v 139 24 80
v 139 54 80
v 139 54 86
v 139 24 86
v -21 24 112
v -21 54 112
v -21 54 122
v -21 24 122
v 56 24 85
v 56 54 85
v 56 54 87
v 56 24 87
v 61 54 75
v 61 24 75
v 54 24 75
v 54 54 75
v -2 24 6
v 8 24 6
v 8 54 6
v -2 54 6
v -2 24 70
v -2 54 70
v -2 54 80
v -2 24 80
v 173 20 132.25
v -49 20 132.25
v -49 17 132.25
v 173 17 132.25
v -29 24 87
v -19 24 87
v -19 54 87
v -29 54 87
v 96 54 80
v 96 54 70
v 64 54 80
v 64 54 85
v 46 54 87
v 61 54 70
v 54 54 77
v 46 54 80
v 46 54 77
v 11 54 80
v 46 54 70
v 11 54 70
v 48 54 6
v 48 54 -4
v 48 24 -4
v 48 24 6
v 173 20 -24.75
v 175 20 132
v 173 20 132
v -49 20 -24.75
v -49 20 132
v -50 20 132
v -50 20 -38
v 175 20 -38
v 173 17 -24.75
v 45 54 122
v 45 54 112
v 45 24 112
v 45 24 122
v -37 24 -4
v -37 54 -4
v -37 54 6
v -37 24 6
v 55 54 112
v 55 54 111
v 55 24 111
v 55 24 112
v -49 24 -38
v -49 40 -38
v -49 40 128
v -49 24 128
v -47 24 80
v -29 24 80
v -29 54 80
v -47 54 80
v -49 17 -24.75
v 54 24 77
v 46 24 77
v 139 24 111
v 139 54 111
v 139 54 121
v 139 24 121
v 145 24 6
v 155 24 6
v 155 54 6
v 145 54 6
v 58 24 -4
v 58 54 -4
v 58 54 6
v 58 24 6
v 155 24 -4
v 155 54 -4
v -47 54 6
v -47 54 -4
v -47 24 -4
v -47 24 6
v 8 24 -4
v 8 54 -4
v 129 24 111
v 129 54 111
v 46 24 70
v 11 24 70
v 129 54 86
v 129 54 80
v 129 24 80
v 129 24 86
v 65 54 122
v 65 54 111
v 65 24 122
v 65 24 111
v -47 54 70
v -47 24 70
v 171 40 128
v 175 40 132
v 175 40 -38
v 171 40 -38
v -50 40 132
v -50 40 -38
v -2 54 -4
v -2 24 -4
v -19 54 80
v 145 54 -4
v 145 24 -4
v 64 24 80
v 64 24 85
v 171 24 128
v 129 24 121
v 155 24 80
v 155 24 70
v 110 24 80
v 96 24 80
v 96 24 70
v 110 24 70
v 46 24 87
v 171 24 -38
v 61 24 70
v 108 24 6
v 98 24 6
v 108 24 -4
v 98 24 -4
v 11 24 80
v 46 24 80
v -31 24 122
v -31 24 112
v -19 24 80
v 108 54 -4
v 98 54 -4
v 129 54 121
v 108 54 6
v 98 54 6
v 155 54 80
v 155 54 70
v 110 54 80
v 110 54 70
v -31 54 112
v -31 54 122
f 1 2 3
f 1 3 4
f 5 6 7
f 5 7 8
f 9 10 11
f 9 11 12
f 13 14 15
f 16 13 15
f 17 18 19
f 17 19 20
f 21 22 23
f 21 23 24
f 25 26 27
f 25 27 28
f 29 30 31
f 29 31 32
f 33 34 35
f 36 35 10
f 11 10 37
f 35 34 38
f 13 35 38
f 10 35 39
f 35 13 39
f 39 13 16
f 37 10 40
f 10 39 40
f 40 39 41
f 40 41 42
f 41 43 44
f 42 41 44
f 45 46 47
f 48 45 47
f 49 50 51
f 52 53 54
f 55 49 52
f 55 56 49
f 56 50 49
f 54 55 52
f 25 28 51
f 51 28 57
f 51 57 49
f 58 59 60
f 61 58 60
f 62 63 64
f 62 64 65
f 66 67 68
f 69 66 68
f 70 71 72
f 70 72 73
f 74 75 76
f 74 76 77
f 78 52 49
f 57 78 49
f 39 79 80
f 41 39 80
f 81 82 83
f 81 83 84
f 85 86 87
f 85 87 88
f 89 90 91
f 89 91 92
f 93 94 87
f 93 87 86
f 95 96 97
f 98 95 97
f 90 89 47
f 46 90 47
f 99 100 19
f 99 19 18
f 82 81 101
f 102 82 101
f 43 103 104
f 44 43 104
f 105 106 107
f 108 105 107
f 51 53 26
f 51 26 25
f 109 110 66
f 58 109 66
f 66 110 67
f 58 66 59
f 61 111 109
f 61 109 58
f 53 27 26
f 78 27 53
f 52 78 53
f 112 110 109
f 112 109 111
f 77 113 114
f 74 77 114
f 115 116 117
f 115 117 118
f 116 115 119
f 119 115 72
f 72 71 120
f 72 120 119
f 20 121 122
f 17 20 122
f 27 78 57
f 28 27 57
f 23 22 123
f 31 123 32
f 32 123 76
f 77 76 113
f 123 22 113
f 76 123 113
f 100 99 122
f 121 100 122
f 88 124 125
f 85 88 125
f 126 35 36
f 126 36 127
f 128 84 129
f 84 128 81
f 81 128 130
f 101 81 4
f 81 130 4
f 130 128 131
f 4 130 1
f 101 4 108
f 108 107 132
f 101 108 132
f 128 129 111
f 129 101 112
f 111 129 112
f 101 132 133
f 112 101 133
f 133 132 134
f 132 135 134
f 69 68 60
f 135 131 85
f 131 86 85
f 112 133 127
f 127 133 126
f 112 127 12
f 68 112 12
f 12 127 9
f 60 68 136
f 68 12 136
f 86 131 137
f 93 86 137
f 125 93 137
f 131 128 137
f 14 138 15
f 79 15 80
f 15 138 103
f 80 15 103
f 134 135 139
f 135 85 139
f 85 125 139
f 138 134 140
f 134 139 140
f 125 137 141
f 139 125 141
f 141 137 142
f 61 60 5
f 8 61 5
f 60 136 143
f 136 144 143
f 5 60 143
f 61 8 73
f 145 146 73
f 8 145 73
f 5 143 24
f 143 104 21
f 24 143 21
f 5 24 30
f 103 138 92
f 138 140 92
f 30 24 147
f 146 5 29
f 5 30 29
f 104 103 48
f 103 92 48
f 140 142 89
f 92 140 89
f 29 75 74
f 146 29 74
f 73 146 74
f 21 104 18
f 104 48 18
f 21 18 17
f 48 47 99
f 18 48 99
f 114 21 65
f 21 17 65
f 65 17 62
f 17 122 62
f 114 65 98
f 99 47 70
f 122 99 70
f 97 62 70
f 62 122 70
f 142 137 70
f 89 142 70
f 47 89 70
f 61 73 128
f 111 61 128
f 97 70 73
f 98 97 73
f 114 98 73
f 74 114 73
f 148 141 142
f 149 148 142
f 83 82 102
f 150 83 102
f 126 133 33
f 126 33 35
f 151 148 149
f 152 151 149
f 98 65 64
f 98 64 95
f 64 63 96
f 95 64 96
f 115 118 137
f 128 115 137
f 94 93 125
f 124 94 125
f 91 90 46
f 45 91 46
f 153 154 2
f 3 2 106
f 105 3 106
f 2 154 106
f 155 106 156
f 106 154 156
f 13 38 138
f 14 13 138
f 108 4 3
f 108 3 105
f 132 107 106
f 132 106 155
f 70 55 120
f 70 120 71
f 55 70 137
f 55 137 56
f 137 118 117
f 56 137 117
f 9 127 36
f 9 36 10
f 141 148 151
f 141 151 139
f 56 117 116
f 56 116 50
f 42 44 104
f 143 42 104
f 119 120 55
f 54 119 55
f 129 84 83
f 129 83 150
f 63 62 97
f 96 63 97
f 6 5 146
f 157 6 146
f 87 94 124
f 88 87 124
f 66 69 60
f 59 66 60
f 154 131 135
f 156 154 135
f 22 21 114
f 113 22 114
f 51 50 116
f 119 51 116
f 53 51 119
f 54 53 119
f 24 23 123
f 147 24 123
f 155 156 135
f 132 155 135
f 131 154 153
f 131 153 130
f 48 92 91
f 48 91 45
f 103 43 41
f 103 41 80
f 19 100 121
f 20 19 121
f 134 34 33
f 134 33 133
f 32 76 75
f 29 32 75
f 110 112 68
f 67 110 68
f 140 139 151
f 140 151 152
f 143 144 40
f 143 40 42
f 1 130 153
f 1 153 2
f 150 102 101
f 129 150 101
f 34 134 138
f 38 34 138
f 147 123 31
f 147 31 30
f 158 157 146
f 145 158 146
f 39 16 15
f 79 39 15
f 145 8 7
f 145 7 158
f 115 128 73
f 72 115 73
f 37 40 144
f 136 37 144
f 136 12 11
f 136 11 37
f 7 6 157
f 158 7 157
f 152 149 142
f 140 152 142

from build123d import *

# Parameters (mm, degrees)
BOX039_W                  = 222
BOX039_H                  = 3
BOX039_DEPTH              = 157
BOX081_W                  = 300
BOX081_H                  = 50
BOX081_DEPTH              = 200
BOX114_W                  = 1
BOX114_H                  = 20
BOX114_DEPTH              = 275
BOX115_W                  = 4
BOX115_H                  = 20
BOX115_DEPTH              = 275
BOX116_W                  = 225
BOX116_H                  = 20
BOX116_DEPTH              = 4
BOX117_W                  = 225
BOX117_H                  = 20
BOX117_DEPTH              = 1
BOX103_W                  = 35
BOX103_H                  = 30
BOX103_DEPTH              = 10
BOX104_W                  = 10
BOX104_H                  = 30
BOX104_DEPTH              = 10
BOX105_W                  = 10
BOX105_H                  = 30
BOX105_DEPTH              = 10
BOX106_W                  = 10
BOX106_H                  = 28.9
BOX106_DEPTH              = 10
BOX091_W                  = 10
BOX091_H                  = 28.9
BOX091_DEPTH              = 10
BOX092_W                  = 10
BOX092_H                  = 28.9
BOX092_DEPTH              = 10
BOX094_W                  = 12
BOX094_H                  = 30
BOX094_DEPTH              = 10
BOX093_W                  = 10
BOX093_H                  = 28.9
BOX093_DEPTH              = 10
BOX095_W                  = 45
BOX095_H                  = 30
BOX095_DEPTH              = 10
BOX097_W                  = 45
BOX097_H                  = 30
BOX097_DEPTH              = 10
BOX096_W                  = 35
BOX096_H                  = 30
BOX096_DEPTH              = 10
BOX098_W                  = 35
BOX098_H                  = 30
BOX098_DEPTH              = 10
BOX099_W                  = 45
BOX099_H                  = 30
BOX099_DEPTH              = 10
BOX100_W                  = 35
BOX100_H                  = 30
BOX100_DEPTH              = 10
BOX101_W                  = 45
BOX101_H                  = 30
BOX101_DEPTH              = 10
BOX082_W                  = 10
BOX082_H                  = 30
BOX082_DEPTH              = 10
BOX102_W                  = 10
BOX102_H                  = 30
BOX102_DEPTH              = 10
BOX083_W                  = 18
BOX083_H                  = 30
BOX083_DEPTH              = 10
BOX084_W                  = 10
BOX084_H                  = 30
BOX084_DEPTH              = 10
BOX085_W                  = 10
BOX085_H                  = 30
BOX085_DEPTH              = 10
BOX086_W                  = 10
BOX086_H                  = 30
BOX086_DEPTH              = 10
BOX087_W                  = 10
BOX087_H                  = 30
BOX087_DEPTH              = 10
BOX113_W                  = 10
BOX113_H                  = 30
BOX113_DEPTH              = 10
BOX112_W                  = 10
BOX112_H                  = 30
BOX112_DEPTH              = 10
BOX111_W                  = 10
BOX111_H                  = 30
BOX111_DEPTH              = 10
BOX109_W                  = 10
BOX109_H                  = 30
BOX109_DEPTH              = 10
BOX108_W                  = 10
BOX108_H                  = 30
BOX108_DEPTH              = 10
BOX088_W                  = 10
BOX088_H                  = 30
BOX088_DEPTH              = 11
BOX089_W                  = 10
BOX089_H                  = 30
BOX089_DEPTH              = 10
BOX090_W                  = 10
BOX090_H                  = 30
BOX090_DEPTH              = 10
BOX110_W                  = 10
BOX110_H                  = 30
BOX110_DEPTH              = 10
BOX107_W                  = 220
BOX107_H                  = 4
BOX107_DEPTH              = 275
FUSION013_PLACEMENT_ANGLE = 180
BOX150_W                  = 1
BOX150_H                  = 20
BOX150_DEPTH              = 275
BOX151_W                  = 4
BOX151_H                  = 20
BOX151_DEPTH              = 275
BOX152_W                  = 225
BOX152_H                  = 20
BOX152_DEPTH              = 4
BOX153_W                  = 225
BOX153_H                  = 20
BOX153_DEPTH              = 1
BOX119_W                  = 35
BOX119_H                  = 30
BOX119_DEPTH              = 10
BOX120_W                  = 10
BOX120_H                  = 30
BOX120_DEPTH              = 10
BOX121_W                  = 10
BOX121_H                  = 30
BOX121_DEPTH              = 10
BOX122_W                  = 10
BOX122_H                  = 28.9
BOX122_DEPTH              = 10
BOX123_W                  = 10
BOX123_H                  = 28.9
BOX123_DEPTH              = 10
BOX124_W                  = 10
BOX124_H                  = 28.9
BOX124_DEPTH              = 10
BOX126_W                  = 12
BOX126_H                  = 30
BOX126_DEPTH              = 10
BOX125_W                  = 10
BOX125_H                  = 28.9
BOX125_DEPTH              = 10
BOX127_W                  = 45
BOX127_H                  = 30
BOX127_DEPTH              = 10
BOX129_W                  = 45
BOX129_H                  = 30
BOX129_DEPTH              = 10
BOX128_W                  = 35
BOX128_H                  = 30
BOX128_DEPTH              = 10
BOX130_W                  = 35
BOX130_H                  = 30
BOX130_DEPTH              = 10
BOX131_W                  = 45
BOX131_H                  = 30
BOX131_DEPTH              = 10
BOX132_W                  = 35
BOX132_H                  = 30
BOX132_DEPTH              = 10
BOX133_W                  = 45
BOX133_H                  = 30
BOX133_DEPTH              = 10
BOX135_W                  = 10
BOX135_H                  = 30
BOX135_DEPTH              = 10
BOX134_W                  = 10
BOX134_H                  = 30
BOX134_DEPTH              = 10
BOX136_W                  = 18
BOX136_H                  = 30
BOX136_DEPTH              = 10
BOX137_W                  = 10
BOX137_H                  = 30
BOX137_DEPTH              = 10
BOX138_W                  = 10
BOX138_H                  = 30
BOX138_DEPTH              = 10
BOX139_W                  = 10
BOX139_H                  = 30
BOX139_DEPTH              = 10
BOX140_W                  = 10
BOX140_H                  = 30
BOX140_DEPTH              = 10
BOX149_W                  = 10
BOX149_H                  = 30
BOX149_DEPTH              = 10
BOX148_W                  = 10
BOX148_H                  = 30
BOX148_DEPTH              = 10
BOX147_W                  = 10
BOX147_H                  = 30
BOX147_DEPTH              = 10
BOX145_W                  = 10
BOX145_H                  = 30
BOX145_DEPTH              = 10
BOX144_W                  = 10
BOX144_H                  = 30
BOX144_DEPTH              = 10
BOX141_W                  = 10
BOX141_H                  = 30
BOX141_DEPTH              = 11
BOX142_W                  = 10
BOX142_H                  = 30
BOX142_DEPTH              = 10
BOX143_W                  = 10
BOX143_H                  = 30
BOX143_DEPTH              = 10
BOX146_W                  = 10
BOX146_H                  = 30
BOX146_DEPTH              = 10
BOX118_W                  = 220
BOX118_H                  = 4
BOX118_DEPTH              = 275
FUSION015_PLACEMENT_ANGLE = 180


with BuildPart() as cubo039:
    # Box039 → Box039 (new body)
    with BuildSketch(Plane(origin=(-49, 17, -24.75), x_dir=(1, 0, 0), z_dir=(0, 0, 1))):
        with Locations((111, 1.5)):
            Rectangle(BOX039_W, BOX039_H)
    extrude(amount=BOX039_DEPTH)


with BuildPart() as cubo081:
    # Box081 → Box081 (new body)
    with BuildSketch(Plane(origin=(-111, 11, -38), x_dir=(1, 0, 0), z_dir=(0, 0, 1))):
        with Locations((150, 25)):
            Rectangle(BOX081_W, BOX081_H)
    extrude(amount=BOX081_DEPTH)


with BuildPart() as cubo114:
    # Box114 → Box114 (new body)
    with BuildSketch(Plane(origin=(-49, 40, -147), x_dir=(-1, 0, 0), z_dir=(0, 0, 1))):
        with Locations((0.5, 10)):
            Rectangle(BOX114_W, BOX114_H)
    extrude(amount=BOX114_DEPTH)


with BuildPart() as cubo115:
    # Box115 → Box115 (new body)
    with BuildSketch(Plane(origin=(175, 40, -147), x_dir=(-1, 0, 0), z_dir=(0, 0, 1))):
        with Locations((2, 10)):
            Rectangle(BOX115_W, BOX115_H)
    extrude(amount=BOX115_DEPTH)


with BuildPart() as cubo116:
    # Box116 → Box116 (new body)
    with BuildSketch(Plane(origin=(175, 40, 128), x_dir=(-1, 0, 0), z_dir=(0, 0, 1))):
        with Locations((112.5, 10)):
            Rectangle(BOX116_W, BOX116_H)
    extrude(amount=BOX116_DEPTH)


with BuildPart() as cubo117:
    # Box117 → Box117 (new body)
    with BuildSketch(Plane(origin=(175, 40, -148), x_dir=(-1, 0, 0), z_dir=(0, 0, 1))):
        with Locations((112.5, 10)):
            Rectangle(BOX117_W, BOX117_H)
    extrude(amount=BOX117_DEPTH)


with BuildPart() as cubo103:
    # Box103 → Box103 (new body)
    with BuildSketch(Plane(origin=(-96, -54, 70), x_dir=(1, 0, 0), z_dir=(0, 0, 1))):
        with Locations((17.5, 15)):
            Rectangle(BOX103_W, BOX103_H)
    extrude(amount=BOX103_DEPTH)


with BuildPart() as cubo104:
    # Box104 → Box104 (new body)
    with BuildSketch(Plane(origin=(-142, -54, -110), x_dir=(1, 0, 0), z_dir=(0, 0, 1))):
        with Locations((5, 15)):
            Rectangle(BOX104_W, BOX104_H)
    extrude(amount=BOX104_DEPTH)


with BuildPart() as cubo105:
    # Box105 → Box105 (new body)
    with BuildSketch(Plane(origin=(-142, -54, -125), x_dir=(1, 0, 0), z_dir=(0, 0, 1))):
        with Locations((5, 15)):
            Rectangle(BOX105_W, BOX105_H)
    extrude(amount=BOX105_DEPTH)


with BuildPart() as cubo106:
    # Box106 → Box106 (new body)
    with BuildSketch(Plane(origin=(-106, -54, -115), x_dir=(1, 0, 0), z_dir=(0, 0, 1))):
        with Locations((5, 14.45)):
            Rectangle(BOX106_W, BOX106_H)
    extrude(amount=BOX106_DEPTH)


with BuildPart() as cubo091:
    # Box091 → Box091 (new body)
    with BuildSketch(Plane(origin=(-142, -54, -146), x_dir=(1, 0, 0), z_dir=(0, 0, 1))):
        with Locations((5, 14.45)):
            Rectangle(BOX091_W, BOX091_H)
    extrude(amount=BOX091_DEPTH)


with BuildPart() as cubo092:
    # Box092 → Box092 (new body)
    with BuildSketch(Plane(origin=(-59, -54, -146), x_dir=(1, 0, 0), z_dir=(0, 0, 1))):
        with Locations((5, 14.45)):
            Rectangle(BOX092_W, BOX092_H)
    extrude(amount=BOX092_DEPTH)


with BuildPart() as cubo094:
    # Box094 → Box094 (new body)
    with BuildSketch(Plane(origin=(-59, -54, -109), x_dir=(1, 0, 0), z_dir=(0, 0, 1))):
        with Locations((6, 15)):
            Rectangle(BOX094_W, BOX094_H)
    extrude(amount=BOX094_DEPTH)


with BuildPart() as cubo093:
    # Box093 → Box093 (new body)
    with BuildSketch(Plane(origin=(-59, -54, -125), x_dir=(1, 0, 0), z_dir=(0, 0, 1))):
        with Locations((5, 14.45)):
            Rectangle(BOX093_W, BOX093_H)
    extrude(amount=BOX093_DEPTH)


with BuildPart() as cubo095:
    # Box095 → Box095 (new body)
    with BuildSketch(Plane(origin=(-155, -54, 70), x_dir=(1, 0, 0), z_dir=(0, 0, 1))):
        with Locations((22.5, 15)):
            Rectangle(BOX095_W, BOX095_H)
    extrude(amount=BOX095_DEPTH)


with BuildPart() as cubo097:
    # Box097 → Box097 (new body)
    with BuildSketch(Plane(origin=(2, -54, 70), x_dir=(1, 0, 0), z_dir=(0, 0, 1))):
        with Locations((22.5, 15)):
            Rectangle(BOX097_W, BOX097_H)
    extrude(amount=BOX097_DEPTH)


with BuildPart() as cubo096:
    # Box096 → Box096 (new body)
    with BuildSketch(Plane(origin=(-46, -54, 70), x_dir=(1, 0, 0), z_dir=(0, 0, 1))):
        with Locations((17.5, 15)):
            Rectangle(BOX096_W, BOX096_H)
    extrude(amount=BOX096_DEPTH)


with BuildPart() as cubo098:
    # Box098 → Box098 (new body)
    with BuildSketch(Plane(origin=(-96, -54, -77), x_dir=(1, 0, 0), z_dir=(0, 0, 1))):
        with Locations((17.5, 15)):
            Rectangle(BOX098_W, BOX098_H)
    extrude(amount=BOX098_DEPTH)


with BuildPart() as cubo099:
    # Box099 → Box099 (new body)
    with BuildSketch(Plane(origin=(-155, -54, -77), x_dir=(1, 0, 0), z_dir=(0, 0, 1))):
        with Locations((22.5, 15)):
            Rectangle(BOX099_W, BOX099_H)
    extrude(amount=BOX099_DEPTH)


with BuildPart() as cubo100:
    # Box100 → Box100 (new body)
    with BuildSketch(Plane(origin=(-46, -54, -77), x_dir=(1, 0, 0), z_dir=(0, 0, 1))):
        with Locations((17.5, 15)):
            Rectangle(BOX100_W, BOX100_H)
    extrude(amount=BOX100_DEPTH)


with BuildPart() as cubo101:
    # Box101 → Box101 (new body)
    with BuildSketch(Plane(origin=(2, -54, -78), x_dir=(1, 0, 0), z_dir=(0, 0, 1))):
        with Locations((22.5, 15)):
            Rectangle(BOX101_W, BOX101_H)
    extrude(amount=BOX101_DEPTH)


with BuildPart() as cubo082:
    # Box082 → Box082 (new body)
    with BuildSketch(Plane(origin=(35, -54, -128), x_dir=(1, 0, 0), z_dir=(0, 0, 1))):
        with Locations((5, 15)):
            Rectangle(BOX082_W, BOX082_H)
    extrude(amount=BOX082_DEPTH)


with BuildPart() as cubo102:
    # Box102 → Box102 (new body)
    with BuildSketch(Plane(origin=(-25, -54, -128), x_dir=(1, 0, 0), z_dir=(0, 0, 1))):
        with Locations((5, 15)):
            Rectangle(BOX102_W, BOX102_H)
    extrude(amount=BOX102_DEPTH)


with BuildPart() as cubo083:
    # Box083 → Box083 (new body)
    with BuildSketch(Plane(origin=(2, -54, -86), x_dir=(1, 0, 0), z_dir=(0, 0, 1))):
        with Locations((9, 15)):
            Rectangle(BOX083_W, BOX083_H)
    extrude(amount=BOX083_DEPTH)


with BuildPart() as cubo084:
    # Box084 → Box084 (new body)
    with BuildSketch(Plane(origin=(-56, -54, 77), x_dir=(1, 0, 0), z_dir=(0, 0, 1))):
        with Locations((5, 15)):
            Rectangle(BOX084_W, BOX084_H)
    extrude(amount=BOX084_DEPTH)


with BuildPart() as cubo085:
    # Box085 → Box085 (new body)
    with BuildSketch(Plane(origin=(21, -54, 112), x_dir=(1, 0, 0), z_dir=(0, 0, 1))):
        with Locations((5, 15)):
            Rectangle(BOX085_W, BOX085_H)
    extrude(amount=BOX085_DEPTH)


with BuildPart() as cubo086:
    # Box086 → Box086 (new body)
    with BuildSketch(Plane(origin=(-55, -54, 112), x_dir=(1, 0, 0), z_dir=(0, 0, 1))):
        with Locations((5, 15)):
            Rectangle(BOX086_W, BOX086_H)
    extrude(amount=BOX086_DEPTH)


with BuildPart() as cubo087:
    # Box087 → Box087 (new body)
    with BuildSketch(Plane(origin=(19, -54, 77), x_dir=(1, 0, 0), z_dir=(0, 0, 1))):
        with Locations((5, 15)):
            Rectangle(BOX087_W, BOX087_H)
    extrude(amount=BOX087_DEPTH)


with BuildPart() as cubo113:
    # Box113 → Box113 (new body)
    with BuildSketch(Plane(origin=(-8, -54, -4), x_dir=(1, 0, 0), z_dir=(0, 0, 1))):
        with Locations((5, 15)):
            Rectangle(BOX113_W, BOX113_H)
    extrude(amount=BOX113_DEPTH)


with BuildPart() as cubo112:
    # Box112 → Box112 (new body)
    with BuildSketch(Plane(origin=(-58, -54, -4), x_dir=(1, 0, 0), z_dir=(0, 0, 1))):
        with Locations((5, 15)):
            Rectangle(BOX112_W, BOX112_H)
    extrude(amount=BOX112_DEPTH)


with BuildPart() as cubo111:
    # Box111 → Box111 (new body)
    with BuildSketch(Plane(origin=(-108, -54, -4), x_dir=(1, 0, 0), z_dir=(0, 0, 1))):
        with Locations((5, 15)):
            Rectangle(BOX111_W, BOX111_H)
    extrude(amount=BOX111_DEPTH)


with BuildPart() as cubo109:
    # Box109 → Box109 (new body)
    with BuildSketch(Plane(origin=(-155, -54, -4), x_dir=(1, 0, 0), z_dir=(0, 0, 1))):
        with Locations((5, 15)):
            Rectangle(BOX109_W, BOX109_H)
    extrude(amount=BOX109_DEPTH)


with BuildPart() as cubo108:
    # Box108 → Box108 (new body)
    with BuildSketch(Plane(origin=(-64, -54, 75), x_dir=(1, 0, 0), z_dir=(0, 0, 1))):
        with Locations((5, 15)):
            Rectangle(BOX108_W, BOX108_H)
    extrude(amount=BOX108_DEPTH)


with BuildPart() as cubo088:
    # Box088 → Box088 (new body)
    with BuildSketch(Plane(origin=(-65, -54, 111), x_dir=(1, 0, 0), z_dir=(0, 0, 1))):
        with Locations((5, 15)):
            Rectangle(BOX088_W, BOX088_H)
    extrude(amount=BOX088_DEPTH)


with BuildPart() as cubo089:
    # Box089 → Box089 (new body)
    with BuildSketch(Plane(origin=(-139, -54, 111), x_dir=(1, 0, 0), z_dir=(0, 0, 1))):
        with Locations((5, 15)):
            Rectangle(BOX089_W, BOX089_H)
    extrude(amount=BOX089_DEPTH)


with BuildPart() as cubo090:
    # Box090 → Box090 (new body)
    with BuildSketch(Plane(origin=(-139, -54, 76), x_dir=(1, 0, 0), z_dir=(0, 0, 1))):
        with Locations((5, 15)):
            Rectangle(BOX090_W, BOX090_H)
    extrude(amount=BOX090_DEPTH)


with BuildPart() as cubo110:
    # Box110 → Box110 (new body)
    with BuildSketch(Plane(origin=(37, -54, -4), x_dir=(1, 0, 0), z_dir=(0, 0, 1))):
        with Locations((5, 15)):
            Rectangle(BOX110_W, BOX110_H)
    extrude(amount=BOX110_DEPTH)


with BuildPart() as cut004:
    # Box107 → Box107 (new body)
    with BuildSketch(Plane(origin=(-171, -24, -147), x_dir=(1, 0, 0), z_dir=(0, 0, 1))):
        with Locations((110, 2)):
            Rectangle(BOX107_W, BOX107_H)
    extrude(amount=BOX107_DEPTH)

    # Fusion013: union Cubo103, Cubo104, Cubo105, Cubo106, Cubo091, Cubo092, Cubo094, Cubo093, Cubo095, Cubo097, Cubo096, Cubo098, Cubo099, Cubo100, Cubo101, Cubo082, Cubo102, Cubo083, Cubo084, Cubo085, Cubo086, Cubo087, Cubo113, Cubo112, Cubo111, Cubo109, Cubo108, Cubo088, Cubo089, Cubo090, Cubo110
    add(cubo103.part)
    add(cubo104.part)
    add(cubo105.part)
    add(cubo106.part)
    add(cubo091.part)
    add(cubo092.part)
    add(cubo094.part)
    add(cubo093.part)
    add(cubo095.part)
    add(cubo097.part)
    add(cubo096.part)
    add(cubo098.part)
    add(cubo099.part)
    add(cubo100.part)
    add(cubo101.part)
    add(cubo082.part)
    add(cubo102.part)
    add(cubo083.part)
    add(cubo084.part)
    add(cubo085.part)
    add(cubo086.part)
    add(cubo087.part)
    add(cubo113.part)
    add(cubo112.part)
    add(cubo111.part)
    add(cubo109.part)
    add(cubo108.part)
    add(cubo088.part)
    add(cubo089.part)
    add(cubo090.part)
    add(cubo110.part)


with BuildPart() as cut004_1:
    # Fusion013 placement: moved
    add(cut004.part.rotate(Axis((0, 0, 0), (0, 0, 1)), FUSION013_PLACEMENT_ANGLE))

    # Fusion014: union Cubo114, Cubo115, Cubo116, Cubo117
    add(cubo114.part)
    add(cubo115.part)
    add(cubo116.part)
    add(cubo117.part)

    # Cut004: cut Cubo081
    add(cubo081.part, mode=Mode.SUBTRACT)


with BuildPart() as cubo150:
    # Box150 → Box150 (new body)
    with BuildSketch(Plane(origin=(-49, 40, -147), x_dir=(-1, 0, 0), z_dir=(0, 0, 1))):
        with Locations((0.5, 10)):
            Rectangle(BOX150_W, BOX150_H)
    extrude(amount=BOX150_DEPTH)


with BuildPart() as cubo151:
    # Box151 → Box151 (new body)
    with BuildSketch(Plane(origin=(175, 40, -147), x_dir=(-1, 0, 0), z_dir=(0, 0, 1))):
        with Locations((2, 10)):
            Rectangle(BOX151_W, BOX151_H)
    extrude(amount=BOX151_DEPTH)


with BuildPart() as cubo152:
    # Box152 → Box152 (new body)
    with BuildSketch(Plane(origin=(175, 40, 128), x_dir=(-1, 0, 0), z_dir=(0, 0, 1))):
        with Locations((112.5, 10)):
            Rectangle(BOX152_W, BOX152_H)
    extrude(amount=BOX152_DEPTH)


with BuildPart() as cubo153:
    # Box153 → Box153 (new body)
    with BuildSketch(Plane(origin=(175, 40, -148), x_dir=(-1, 0, 0), z_dir=(0, 0, 1))):
        with Locations((112.5, 10)):
            Rectangle(BOX153_W, BOX153_H)
    extrude(amount=BOX153_DEPTH)


with BuildPart() as cubo119:
    # Box119 → Box119 (new body)
    with BuildSketch(Plane(origin=(-96, -54, 70), x_dir=(1, 0, 0), z_dir=(0, 0, 1))):
        with Locations((17.5, 15)):
            Rectangle(BOX119_W, BOX119_H)
    extrude(amount=BOX119_DEPTH)


with BuildPart() as cubo120:
    # Box120 → Box120 (new body)
    with BuildSketch(Plane(origin=(-142, -54, -110), x_dir=(1, 0, 0), z_dir=(0, 0, 1))):
        with Locations((5, 15)):
            Rectangle(BOX120_W, BOX120_H)
    extrude(amount=BOX120_DEPTH)


with BuildPart() as cubo121:
    # Box121 → Box121 (new body)
    with BuildSketch(Plane(origin=(-142, -54, -125), x_dir=(1, 0, 0), z_dir=(0, 0, 1))):
        with Locations((5, 15)):
            Rectangle(BOX121_W, BOX121_H)
    extrude(amount=BOX121_DEPTH)


with BuildPart() as cubo122:
    # Box122 → Box122 (new body)
    with BuildSketch(Plane(origin=(-106, -54, -115), x_dir=(1, 0, 0), z_dir=(0, 0, 1))):
        with Locations((5, 14.45)):
            Rectangle(BOX122_W, BOX122_H)
    extrude(amount=BOX122_DEPTH)


with BuildPart() as cubo123:
    # Box123 → Box123 (new body)
    with BuildSketch(Plane(origin=(-142, -54, -146), x_dir=(1, 0, 0), z_dir=(0, 0, 1))):
        with Locations((5, 14.45)):
            Rectangle(BOX123_W, BOX123_H)
    extrude(amount=BOX123_DEPTH)


with BuildPart() as cubo124:
    # Box124 → Box124 (new body)
    with BuildSketch(Plane(origin=(-59, -54, -146), x_dir=(1, 0, 0), z_dir=(0, 0, 1))):
        with Locations((5, 14.45)):
            Rectangle(BOX124_W, BOX124_H)
    extrude(amount=BOX124_DEPTH)


with BuildPart() as cubo126:
    # Box126 → Box126 (new body)
    with BuildSketch(Plane(origin=(-59, -54, -109), x_dir=(1, 0, 0), z_dir=(0, 0, 1))):
        with Locations((6, 15)):
            Rectangle(BOX126_W, BOX126_H)
    extrude(amount=BOX126_DEPTH)


with BuildPart() as cubo125:
    # Box125 → Box125 (new body)
    with BuildSketch(Plane(origin=(-59, -54, -125), x_dir=(1, 0, 0), z_dir=(0, 0, 1))):
        with Locations((5, 14.45)):
            Rectangle(BOX125_W, BOX125_H)
    extrude(amount=BOX125_DEPTH)


with BuildPart() as cubo127:
    # Box127 → Box127 (new body)
    with BuildSketch(Plane(origin=(-155, -54, 70), x_dir=(1, 0, 0), z_dir=(0, 0, 1))):
        with Locations((22.5, 15)):
            Rectangle(BOX127_W, BOX127_H)
    extrude(amount=BOX127_DEPTH)


with BuildPart() as cubo129:
    # Box129 → Box129 (new body)
    with BuildSketch(Plane(origin=(2, -54, 70), x_dir=(1, 0, 0), z_dir=(0, 0, 1))):
        with Locations((22.5, 15)):
            Rectangle(BOX129_W, BOX129_H)
    extrude(amount=BOX129_DEPTH)


with BuildPart() as cubo128:
    # Box128 → Box128 (new body)
    with BuildSketch(Plane(origin=(-46, -54, 70), x_dir=(1, 0, 0), z_dir=(0, 0, 1))):
        with Locations((17.5, 15)):
            Rectangle(BOX128_W, BOX128_H)
    extrude(amount=BOX128_DEPTH)


with BuildPart() as cubo130:
    # Box130 → Box130 (new body)
    with BuildSketch(Plane(origin=(-96, -54, -77), x_dir=(1, 0, 0), z_dir=(0, 0, 1))):
        with Locations((17.5, 15)):
            Rectangle(BOX130_W, BOX130_H)
    extrude(amount=BOX130_DEPTH)


with BuildPart() as cubo131:
    # Box131 → Box131 (new body)
    with BuildSketch(Plane(origin=(-155, -54, -77), x_dir=(1, 0, 0), z_dir=(0, 0, 1))):
        with Locations((22.5, 15)):
            Rectangle(BOX131_W, BOX131_H)
    extrude(amount=BOX131_DEPTH)


with BuildPart() as cubo132:
    # Box132 → Box132 (new body)
    with BuildSketch(Plane(origin=(-46, -54, -77), x_dir=(1, 0, 0), z_dir=(0, 0, 1))):
        with Locations((17.5, 15)):
            Rectangle(BOX132_W, BOX132_H)
    extrude(amount=BOX132_DEPTH)


with BuildPart() as cubo133:
    # Box133 → Box133 (new body)
    with BuildSketch(Plane(origin=(2, -54, -78), x_dir=(1, 0, 0), z_dir=(0, 0, 1))):
        with Locations((22.5, 15)):
            Rectangle(BOX133_W, BOX133_H)
    extrude(amount=BOX133_DEPTH)


with BuildPart() as cubo135:
    # Box135 → Box135 (new body)
    with BuildSketch(Plane(origin=(35, -54, -128), x_dir=(1, 0, 0), z_dir=(0, 0, 1))):
        with Locations((5, 15)):
            Rectangle(BOX135_W, BOX135_H)
    extrude(amount=BOX135_DEPTH)


with BuildPart() as cubo134:
    # Box134 → Box134 (new body)
    with BuildSketch(Plane(origin=(-25, -54, -128), x_dir=(1, 0, 0), z_dir=(0, 0, 1))):
        with Locations((5, 15)):
            Rectangle(BOX134_W, BOX134_H)
    extrude(amount=BOX134_DEPTH)


with BuildPart() as cubo136:
    # Box136 → Box136 (new body)
    with BuildSketch(Plane(origin=(2, -54, -86), x_dir=(1, 0, 0), z_dir=(0, 0, 1))):
        with Locations((9, 15)):
            Rectangle(BOX136_W, BOX136_H)
    extrude(amount=BOX136_DEPTH)


with BuildPart() as cubo137:
    # Box137 → Box137 (new body)
    with BuildSketch(Plane(origin=(-56, -54, 77), x_dir=(1, 0, 0), z_dir=(0, 0, 1))):
        with Locations((5, 15)):
            Rectangle(BOX137_W, BOX137_H)
    extrude(amount=BOX137_DEPTH)


with BuildPart() as cubo138:
    # Box138 → Box138 (new body)
    with BuildSketch(Plane(origin=(21, -54, 112), x_dir=(1, 0, 0), z_dir=(0, 0, 1))):
        with Locations((5, 15)):
            Rectangle(BOX138_W, BOX138_H)
    extrude(amount=BOX138_DEPTH)


with BuildPart() as cubo139:
    # Box139 → Box139 (new body)
    with BuildSketch(Plane(origin=(-55, -54, 112), x_dir=(1, 0, 0), z_dir=(0, 0, 1))):
        with Locations((5, 15)):
            Rectangle(BOX139_W, BOX139_H)
    extrude(amount=BOX139_DEPTH)


with BuildPart() as cubo140:
    # Box140 → Box140 (new body)
    with BuildSketch(Plane(origin=(19, -54, 77), x_dir=(1, 0, 0), z_dir=(0, 0, 1))):
        with Locations((5, 15)):
            Rectangle(BOX140_W, BOX140_H)
    extrude(amount=BOX140_DEPTH)


with BuildPart() as cubo149:
    # Box149 → Box149 (new body)
    with BuildSketch(Plane(origin=(-8, -54, -4), x_dir=(1, 0, 0), z_dir=(0, 0, 1))):
        with Locations((5, 15)):
            Rectangle(BOX149_W, BOX149_H)
    extrude(amount=BOX149_DEPTH)


with BuildPart() as cubo148:
    # Box148 → Box148 (new body)
    with BuildSketch(Plane(origin=(-58, -54, -4), x_dir=(1, 0, 0), z_dir=(0, 0, 1))):
        with Locations((5, 15)):
            Rectangle(BOX148_W, BOX148_H)
    extrude(amount=BOX148_DEPTH)


with BuildPart() as cubo147:
    # Box147 → Box147 (new body)
    with BuildSketch(Plane(origin=(-108, -54, -4), x_dir=(1, 0, 0), z_dir=(0, 0, 1))):
        with Locations((5, 15)):
            Rectangle(BOX147_W, BOX147_H)
    extrude(amount=BOX147_DEPTH)


with BuildPart() as cubo145:
    # Box145 → Box145 (new body)
    with BuildSketch(Plane(origin=(-155, -54, -4), x_dir=(1, 0, 0), z_dir=(0, 0, 1))):
        with Locations((5, 15)):
            Rectangle(BOX145_W, BOX145_H)
    extrude(amount=BOX145_DEPTH)


with BuildPart() as cubo144:
    # Box144 → Box144 (new body)
    with BuildSketch(Plane(origin=(-64, -54, 75), x_dir=(1, 0, 0), z_dir=(0, 0, 1))):
        with Locations((5, 15)):
            Rectangle(BOX144_W, BOX144_H)
    extrude(amount=BOX144_DEPTH)


with BuildPart() as cubo141:
    # Box141 → Box141 (new body)
    with BuildSketch(Plane(origin=(-65, -54, 111), x_dir=(1, 0, 0), z_dir=(0, 0, 1))):
        with Locations((5, 15)):
            Rectangle(BOX141_W, BOX141_H)
    extrude(amount=BOX141_DEPTH)


with BuildPart() as cubo142:
    # Box142 → Box142 (new body)
    with BuildSketch(Plane(origin=(-139, -54, 111), x_dir=(1, 0, 0), z_dir=(0, 0, 1))):
        with Locations((5, 15)):
            Rectangle(BOX142_W, BOX142_H)
    extrude(amount=BOX142_DEPTH)


with BuildPart() as cubo143:
    # Box143 → Box143 (new body)
    with BuildSketch(Plane(origin=(-139, -54, 76), x_dir=(1, 0, 0), z_dir=(0, 0, 1))):
        with Locations((5, 15)):
            Rectangle(BOX143_W, BOX143_H)
    extrude(amount=BOX143_DEPTH)


with BuildPart() as cubo146:
    # Box146 → Box146 (new body)
    with BuildSketch(Plane(origin=(37, -54, -4), x_dir=(1, 0, 0), z_dir=(0, 0, 1))):
        with Locations((5, 15)):
            Rectangle(BOX146_W, BOX146_H)
    extrude(amount=BOX146_DEPTH)


with BuildPart() as parte2completa:
    # Box118 → Box118 (new body)
    with BuildSketch(Plane(origin=(-171, -24, -147), x_dir=(1, 0, 0), z_dir=(0, 0, 1))):
        with Locations((110, 2)):
            Rectangle(BOX118_W, BOX118_H)
    extrude(amount=BOX118_DEPTH)

    # Fusion015: union Cubo119, Cubo120, Cubo121, Cubo122, Cubo123, Cubo124, Cubo126, Cubo125, Cubo127, Cubo129, Cubo128, Cubo130, Cubo131, Cubo132, Cubo133, Cubo135, Cubo134, Cubo136, Cubo137, Cubo138, Cubo139, Cubo140, Cubo149, Cubo148, Cubo147, Cubo145, Cubo144, Cubo141, Cubo142, Cubo143, Cubo146
    add(cubo119.part)
    add(cubo120.part)
    add(cubo121.part)
    add(cubo122.part)
    add(cubo123.part)
    add(cubo124.part)
    add(cubo126.part)
    add(cubo125.part)
    add(cubo127.part)
    add(cubo129.part)
    add(cubo128.part)
    add(cubo130.part)
    add(cubo131.part)
    add(cubo132.part)
    add(cubo133.part)
    add(cubo135.part)
    add(cubo134.part)
    add(cubo136.part)
    add(cubo137.part)
    add(cubo138.part)
    add(cubo139.part)
    add(cubo140.part)
    add(cubo149.part)
    add(cubo148.part)
    add(cubo147.part)
    add(cubo145.part)
    add(cubo144.part)
    add(cubo141.part)
    add(cubo142.part)
    add(cubo143.part)
    add(cubo146.part)


with BuildPart() as parte2completa_1:
    # Fusion015 placement: moved
    add(parte2completa.part.rotate(Axis((0, 0, 0), (0, 0, 1)), FUSION015_PLACEMENT_ANGLE))

    # Fusion016: union Cubo150, Cubo151, Cubo152, Cubo153
    add(cubo150.part)
    add(cubo151.part)
    add(cubo152.part)
    add(cubo153.part)

    # Cut005: cut Cut004
    add(cut004_1.part, mode=Mode.SUBTRACT)

    # Fusion020: union Cubo039
    add(cubo039.part)


solid = parte2completa_1.part
